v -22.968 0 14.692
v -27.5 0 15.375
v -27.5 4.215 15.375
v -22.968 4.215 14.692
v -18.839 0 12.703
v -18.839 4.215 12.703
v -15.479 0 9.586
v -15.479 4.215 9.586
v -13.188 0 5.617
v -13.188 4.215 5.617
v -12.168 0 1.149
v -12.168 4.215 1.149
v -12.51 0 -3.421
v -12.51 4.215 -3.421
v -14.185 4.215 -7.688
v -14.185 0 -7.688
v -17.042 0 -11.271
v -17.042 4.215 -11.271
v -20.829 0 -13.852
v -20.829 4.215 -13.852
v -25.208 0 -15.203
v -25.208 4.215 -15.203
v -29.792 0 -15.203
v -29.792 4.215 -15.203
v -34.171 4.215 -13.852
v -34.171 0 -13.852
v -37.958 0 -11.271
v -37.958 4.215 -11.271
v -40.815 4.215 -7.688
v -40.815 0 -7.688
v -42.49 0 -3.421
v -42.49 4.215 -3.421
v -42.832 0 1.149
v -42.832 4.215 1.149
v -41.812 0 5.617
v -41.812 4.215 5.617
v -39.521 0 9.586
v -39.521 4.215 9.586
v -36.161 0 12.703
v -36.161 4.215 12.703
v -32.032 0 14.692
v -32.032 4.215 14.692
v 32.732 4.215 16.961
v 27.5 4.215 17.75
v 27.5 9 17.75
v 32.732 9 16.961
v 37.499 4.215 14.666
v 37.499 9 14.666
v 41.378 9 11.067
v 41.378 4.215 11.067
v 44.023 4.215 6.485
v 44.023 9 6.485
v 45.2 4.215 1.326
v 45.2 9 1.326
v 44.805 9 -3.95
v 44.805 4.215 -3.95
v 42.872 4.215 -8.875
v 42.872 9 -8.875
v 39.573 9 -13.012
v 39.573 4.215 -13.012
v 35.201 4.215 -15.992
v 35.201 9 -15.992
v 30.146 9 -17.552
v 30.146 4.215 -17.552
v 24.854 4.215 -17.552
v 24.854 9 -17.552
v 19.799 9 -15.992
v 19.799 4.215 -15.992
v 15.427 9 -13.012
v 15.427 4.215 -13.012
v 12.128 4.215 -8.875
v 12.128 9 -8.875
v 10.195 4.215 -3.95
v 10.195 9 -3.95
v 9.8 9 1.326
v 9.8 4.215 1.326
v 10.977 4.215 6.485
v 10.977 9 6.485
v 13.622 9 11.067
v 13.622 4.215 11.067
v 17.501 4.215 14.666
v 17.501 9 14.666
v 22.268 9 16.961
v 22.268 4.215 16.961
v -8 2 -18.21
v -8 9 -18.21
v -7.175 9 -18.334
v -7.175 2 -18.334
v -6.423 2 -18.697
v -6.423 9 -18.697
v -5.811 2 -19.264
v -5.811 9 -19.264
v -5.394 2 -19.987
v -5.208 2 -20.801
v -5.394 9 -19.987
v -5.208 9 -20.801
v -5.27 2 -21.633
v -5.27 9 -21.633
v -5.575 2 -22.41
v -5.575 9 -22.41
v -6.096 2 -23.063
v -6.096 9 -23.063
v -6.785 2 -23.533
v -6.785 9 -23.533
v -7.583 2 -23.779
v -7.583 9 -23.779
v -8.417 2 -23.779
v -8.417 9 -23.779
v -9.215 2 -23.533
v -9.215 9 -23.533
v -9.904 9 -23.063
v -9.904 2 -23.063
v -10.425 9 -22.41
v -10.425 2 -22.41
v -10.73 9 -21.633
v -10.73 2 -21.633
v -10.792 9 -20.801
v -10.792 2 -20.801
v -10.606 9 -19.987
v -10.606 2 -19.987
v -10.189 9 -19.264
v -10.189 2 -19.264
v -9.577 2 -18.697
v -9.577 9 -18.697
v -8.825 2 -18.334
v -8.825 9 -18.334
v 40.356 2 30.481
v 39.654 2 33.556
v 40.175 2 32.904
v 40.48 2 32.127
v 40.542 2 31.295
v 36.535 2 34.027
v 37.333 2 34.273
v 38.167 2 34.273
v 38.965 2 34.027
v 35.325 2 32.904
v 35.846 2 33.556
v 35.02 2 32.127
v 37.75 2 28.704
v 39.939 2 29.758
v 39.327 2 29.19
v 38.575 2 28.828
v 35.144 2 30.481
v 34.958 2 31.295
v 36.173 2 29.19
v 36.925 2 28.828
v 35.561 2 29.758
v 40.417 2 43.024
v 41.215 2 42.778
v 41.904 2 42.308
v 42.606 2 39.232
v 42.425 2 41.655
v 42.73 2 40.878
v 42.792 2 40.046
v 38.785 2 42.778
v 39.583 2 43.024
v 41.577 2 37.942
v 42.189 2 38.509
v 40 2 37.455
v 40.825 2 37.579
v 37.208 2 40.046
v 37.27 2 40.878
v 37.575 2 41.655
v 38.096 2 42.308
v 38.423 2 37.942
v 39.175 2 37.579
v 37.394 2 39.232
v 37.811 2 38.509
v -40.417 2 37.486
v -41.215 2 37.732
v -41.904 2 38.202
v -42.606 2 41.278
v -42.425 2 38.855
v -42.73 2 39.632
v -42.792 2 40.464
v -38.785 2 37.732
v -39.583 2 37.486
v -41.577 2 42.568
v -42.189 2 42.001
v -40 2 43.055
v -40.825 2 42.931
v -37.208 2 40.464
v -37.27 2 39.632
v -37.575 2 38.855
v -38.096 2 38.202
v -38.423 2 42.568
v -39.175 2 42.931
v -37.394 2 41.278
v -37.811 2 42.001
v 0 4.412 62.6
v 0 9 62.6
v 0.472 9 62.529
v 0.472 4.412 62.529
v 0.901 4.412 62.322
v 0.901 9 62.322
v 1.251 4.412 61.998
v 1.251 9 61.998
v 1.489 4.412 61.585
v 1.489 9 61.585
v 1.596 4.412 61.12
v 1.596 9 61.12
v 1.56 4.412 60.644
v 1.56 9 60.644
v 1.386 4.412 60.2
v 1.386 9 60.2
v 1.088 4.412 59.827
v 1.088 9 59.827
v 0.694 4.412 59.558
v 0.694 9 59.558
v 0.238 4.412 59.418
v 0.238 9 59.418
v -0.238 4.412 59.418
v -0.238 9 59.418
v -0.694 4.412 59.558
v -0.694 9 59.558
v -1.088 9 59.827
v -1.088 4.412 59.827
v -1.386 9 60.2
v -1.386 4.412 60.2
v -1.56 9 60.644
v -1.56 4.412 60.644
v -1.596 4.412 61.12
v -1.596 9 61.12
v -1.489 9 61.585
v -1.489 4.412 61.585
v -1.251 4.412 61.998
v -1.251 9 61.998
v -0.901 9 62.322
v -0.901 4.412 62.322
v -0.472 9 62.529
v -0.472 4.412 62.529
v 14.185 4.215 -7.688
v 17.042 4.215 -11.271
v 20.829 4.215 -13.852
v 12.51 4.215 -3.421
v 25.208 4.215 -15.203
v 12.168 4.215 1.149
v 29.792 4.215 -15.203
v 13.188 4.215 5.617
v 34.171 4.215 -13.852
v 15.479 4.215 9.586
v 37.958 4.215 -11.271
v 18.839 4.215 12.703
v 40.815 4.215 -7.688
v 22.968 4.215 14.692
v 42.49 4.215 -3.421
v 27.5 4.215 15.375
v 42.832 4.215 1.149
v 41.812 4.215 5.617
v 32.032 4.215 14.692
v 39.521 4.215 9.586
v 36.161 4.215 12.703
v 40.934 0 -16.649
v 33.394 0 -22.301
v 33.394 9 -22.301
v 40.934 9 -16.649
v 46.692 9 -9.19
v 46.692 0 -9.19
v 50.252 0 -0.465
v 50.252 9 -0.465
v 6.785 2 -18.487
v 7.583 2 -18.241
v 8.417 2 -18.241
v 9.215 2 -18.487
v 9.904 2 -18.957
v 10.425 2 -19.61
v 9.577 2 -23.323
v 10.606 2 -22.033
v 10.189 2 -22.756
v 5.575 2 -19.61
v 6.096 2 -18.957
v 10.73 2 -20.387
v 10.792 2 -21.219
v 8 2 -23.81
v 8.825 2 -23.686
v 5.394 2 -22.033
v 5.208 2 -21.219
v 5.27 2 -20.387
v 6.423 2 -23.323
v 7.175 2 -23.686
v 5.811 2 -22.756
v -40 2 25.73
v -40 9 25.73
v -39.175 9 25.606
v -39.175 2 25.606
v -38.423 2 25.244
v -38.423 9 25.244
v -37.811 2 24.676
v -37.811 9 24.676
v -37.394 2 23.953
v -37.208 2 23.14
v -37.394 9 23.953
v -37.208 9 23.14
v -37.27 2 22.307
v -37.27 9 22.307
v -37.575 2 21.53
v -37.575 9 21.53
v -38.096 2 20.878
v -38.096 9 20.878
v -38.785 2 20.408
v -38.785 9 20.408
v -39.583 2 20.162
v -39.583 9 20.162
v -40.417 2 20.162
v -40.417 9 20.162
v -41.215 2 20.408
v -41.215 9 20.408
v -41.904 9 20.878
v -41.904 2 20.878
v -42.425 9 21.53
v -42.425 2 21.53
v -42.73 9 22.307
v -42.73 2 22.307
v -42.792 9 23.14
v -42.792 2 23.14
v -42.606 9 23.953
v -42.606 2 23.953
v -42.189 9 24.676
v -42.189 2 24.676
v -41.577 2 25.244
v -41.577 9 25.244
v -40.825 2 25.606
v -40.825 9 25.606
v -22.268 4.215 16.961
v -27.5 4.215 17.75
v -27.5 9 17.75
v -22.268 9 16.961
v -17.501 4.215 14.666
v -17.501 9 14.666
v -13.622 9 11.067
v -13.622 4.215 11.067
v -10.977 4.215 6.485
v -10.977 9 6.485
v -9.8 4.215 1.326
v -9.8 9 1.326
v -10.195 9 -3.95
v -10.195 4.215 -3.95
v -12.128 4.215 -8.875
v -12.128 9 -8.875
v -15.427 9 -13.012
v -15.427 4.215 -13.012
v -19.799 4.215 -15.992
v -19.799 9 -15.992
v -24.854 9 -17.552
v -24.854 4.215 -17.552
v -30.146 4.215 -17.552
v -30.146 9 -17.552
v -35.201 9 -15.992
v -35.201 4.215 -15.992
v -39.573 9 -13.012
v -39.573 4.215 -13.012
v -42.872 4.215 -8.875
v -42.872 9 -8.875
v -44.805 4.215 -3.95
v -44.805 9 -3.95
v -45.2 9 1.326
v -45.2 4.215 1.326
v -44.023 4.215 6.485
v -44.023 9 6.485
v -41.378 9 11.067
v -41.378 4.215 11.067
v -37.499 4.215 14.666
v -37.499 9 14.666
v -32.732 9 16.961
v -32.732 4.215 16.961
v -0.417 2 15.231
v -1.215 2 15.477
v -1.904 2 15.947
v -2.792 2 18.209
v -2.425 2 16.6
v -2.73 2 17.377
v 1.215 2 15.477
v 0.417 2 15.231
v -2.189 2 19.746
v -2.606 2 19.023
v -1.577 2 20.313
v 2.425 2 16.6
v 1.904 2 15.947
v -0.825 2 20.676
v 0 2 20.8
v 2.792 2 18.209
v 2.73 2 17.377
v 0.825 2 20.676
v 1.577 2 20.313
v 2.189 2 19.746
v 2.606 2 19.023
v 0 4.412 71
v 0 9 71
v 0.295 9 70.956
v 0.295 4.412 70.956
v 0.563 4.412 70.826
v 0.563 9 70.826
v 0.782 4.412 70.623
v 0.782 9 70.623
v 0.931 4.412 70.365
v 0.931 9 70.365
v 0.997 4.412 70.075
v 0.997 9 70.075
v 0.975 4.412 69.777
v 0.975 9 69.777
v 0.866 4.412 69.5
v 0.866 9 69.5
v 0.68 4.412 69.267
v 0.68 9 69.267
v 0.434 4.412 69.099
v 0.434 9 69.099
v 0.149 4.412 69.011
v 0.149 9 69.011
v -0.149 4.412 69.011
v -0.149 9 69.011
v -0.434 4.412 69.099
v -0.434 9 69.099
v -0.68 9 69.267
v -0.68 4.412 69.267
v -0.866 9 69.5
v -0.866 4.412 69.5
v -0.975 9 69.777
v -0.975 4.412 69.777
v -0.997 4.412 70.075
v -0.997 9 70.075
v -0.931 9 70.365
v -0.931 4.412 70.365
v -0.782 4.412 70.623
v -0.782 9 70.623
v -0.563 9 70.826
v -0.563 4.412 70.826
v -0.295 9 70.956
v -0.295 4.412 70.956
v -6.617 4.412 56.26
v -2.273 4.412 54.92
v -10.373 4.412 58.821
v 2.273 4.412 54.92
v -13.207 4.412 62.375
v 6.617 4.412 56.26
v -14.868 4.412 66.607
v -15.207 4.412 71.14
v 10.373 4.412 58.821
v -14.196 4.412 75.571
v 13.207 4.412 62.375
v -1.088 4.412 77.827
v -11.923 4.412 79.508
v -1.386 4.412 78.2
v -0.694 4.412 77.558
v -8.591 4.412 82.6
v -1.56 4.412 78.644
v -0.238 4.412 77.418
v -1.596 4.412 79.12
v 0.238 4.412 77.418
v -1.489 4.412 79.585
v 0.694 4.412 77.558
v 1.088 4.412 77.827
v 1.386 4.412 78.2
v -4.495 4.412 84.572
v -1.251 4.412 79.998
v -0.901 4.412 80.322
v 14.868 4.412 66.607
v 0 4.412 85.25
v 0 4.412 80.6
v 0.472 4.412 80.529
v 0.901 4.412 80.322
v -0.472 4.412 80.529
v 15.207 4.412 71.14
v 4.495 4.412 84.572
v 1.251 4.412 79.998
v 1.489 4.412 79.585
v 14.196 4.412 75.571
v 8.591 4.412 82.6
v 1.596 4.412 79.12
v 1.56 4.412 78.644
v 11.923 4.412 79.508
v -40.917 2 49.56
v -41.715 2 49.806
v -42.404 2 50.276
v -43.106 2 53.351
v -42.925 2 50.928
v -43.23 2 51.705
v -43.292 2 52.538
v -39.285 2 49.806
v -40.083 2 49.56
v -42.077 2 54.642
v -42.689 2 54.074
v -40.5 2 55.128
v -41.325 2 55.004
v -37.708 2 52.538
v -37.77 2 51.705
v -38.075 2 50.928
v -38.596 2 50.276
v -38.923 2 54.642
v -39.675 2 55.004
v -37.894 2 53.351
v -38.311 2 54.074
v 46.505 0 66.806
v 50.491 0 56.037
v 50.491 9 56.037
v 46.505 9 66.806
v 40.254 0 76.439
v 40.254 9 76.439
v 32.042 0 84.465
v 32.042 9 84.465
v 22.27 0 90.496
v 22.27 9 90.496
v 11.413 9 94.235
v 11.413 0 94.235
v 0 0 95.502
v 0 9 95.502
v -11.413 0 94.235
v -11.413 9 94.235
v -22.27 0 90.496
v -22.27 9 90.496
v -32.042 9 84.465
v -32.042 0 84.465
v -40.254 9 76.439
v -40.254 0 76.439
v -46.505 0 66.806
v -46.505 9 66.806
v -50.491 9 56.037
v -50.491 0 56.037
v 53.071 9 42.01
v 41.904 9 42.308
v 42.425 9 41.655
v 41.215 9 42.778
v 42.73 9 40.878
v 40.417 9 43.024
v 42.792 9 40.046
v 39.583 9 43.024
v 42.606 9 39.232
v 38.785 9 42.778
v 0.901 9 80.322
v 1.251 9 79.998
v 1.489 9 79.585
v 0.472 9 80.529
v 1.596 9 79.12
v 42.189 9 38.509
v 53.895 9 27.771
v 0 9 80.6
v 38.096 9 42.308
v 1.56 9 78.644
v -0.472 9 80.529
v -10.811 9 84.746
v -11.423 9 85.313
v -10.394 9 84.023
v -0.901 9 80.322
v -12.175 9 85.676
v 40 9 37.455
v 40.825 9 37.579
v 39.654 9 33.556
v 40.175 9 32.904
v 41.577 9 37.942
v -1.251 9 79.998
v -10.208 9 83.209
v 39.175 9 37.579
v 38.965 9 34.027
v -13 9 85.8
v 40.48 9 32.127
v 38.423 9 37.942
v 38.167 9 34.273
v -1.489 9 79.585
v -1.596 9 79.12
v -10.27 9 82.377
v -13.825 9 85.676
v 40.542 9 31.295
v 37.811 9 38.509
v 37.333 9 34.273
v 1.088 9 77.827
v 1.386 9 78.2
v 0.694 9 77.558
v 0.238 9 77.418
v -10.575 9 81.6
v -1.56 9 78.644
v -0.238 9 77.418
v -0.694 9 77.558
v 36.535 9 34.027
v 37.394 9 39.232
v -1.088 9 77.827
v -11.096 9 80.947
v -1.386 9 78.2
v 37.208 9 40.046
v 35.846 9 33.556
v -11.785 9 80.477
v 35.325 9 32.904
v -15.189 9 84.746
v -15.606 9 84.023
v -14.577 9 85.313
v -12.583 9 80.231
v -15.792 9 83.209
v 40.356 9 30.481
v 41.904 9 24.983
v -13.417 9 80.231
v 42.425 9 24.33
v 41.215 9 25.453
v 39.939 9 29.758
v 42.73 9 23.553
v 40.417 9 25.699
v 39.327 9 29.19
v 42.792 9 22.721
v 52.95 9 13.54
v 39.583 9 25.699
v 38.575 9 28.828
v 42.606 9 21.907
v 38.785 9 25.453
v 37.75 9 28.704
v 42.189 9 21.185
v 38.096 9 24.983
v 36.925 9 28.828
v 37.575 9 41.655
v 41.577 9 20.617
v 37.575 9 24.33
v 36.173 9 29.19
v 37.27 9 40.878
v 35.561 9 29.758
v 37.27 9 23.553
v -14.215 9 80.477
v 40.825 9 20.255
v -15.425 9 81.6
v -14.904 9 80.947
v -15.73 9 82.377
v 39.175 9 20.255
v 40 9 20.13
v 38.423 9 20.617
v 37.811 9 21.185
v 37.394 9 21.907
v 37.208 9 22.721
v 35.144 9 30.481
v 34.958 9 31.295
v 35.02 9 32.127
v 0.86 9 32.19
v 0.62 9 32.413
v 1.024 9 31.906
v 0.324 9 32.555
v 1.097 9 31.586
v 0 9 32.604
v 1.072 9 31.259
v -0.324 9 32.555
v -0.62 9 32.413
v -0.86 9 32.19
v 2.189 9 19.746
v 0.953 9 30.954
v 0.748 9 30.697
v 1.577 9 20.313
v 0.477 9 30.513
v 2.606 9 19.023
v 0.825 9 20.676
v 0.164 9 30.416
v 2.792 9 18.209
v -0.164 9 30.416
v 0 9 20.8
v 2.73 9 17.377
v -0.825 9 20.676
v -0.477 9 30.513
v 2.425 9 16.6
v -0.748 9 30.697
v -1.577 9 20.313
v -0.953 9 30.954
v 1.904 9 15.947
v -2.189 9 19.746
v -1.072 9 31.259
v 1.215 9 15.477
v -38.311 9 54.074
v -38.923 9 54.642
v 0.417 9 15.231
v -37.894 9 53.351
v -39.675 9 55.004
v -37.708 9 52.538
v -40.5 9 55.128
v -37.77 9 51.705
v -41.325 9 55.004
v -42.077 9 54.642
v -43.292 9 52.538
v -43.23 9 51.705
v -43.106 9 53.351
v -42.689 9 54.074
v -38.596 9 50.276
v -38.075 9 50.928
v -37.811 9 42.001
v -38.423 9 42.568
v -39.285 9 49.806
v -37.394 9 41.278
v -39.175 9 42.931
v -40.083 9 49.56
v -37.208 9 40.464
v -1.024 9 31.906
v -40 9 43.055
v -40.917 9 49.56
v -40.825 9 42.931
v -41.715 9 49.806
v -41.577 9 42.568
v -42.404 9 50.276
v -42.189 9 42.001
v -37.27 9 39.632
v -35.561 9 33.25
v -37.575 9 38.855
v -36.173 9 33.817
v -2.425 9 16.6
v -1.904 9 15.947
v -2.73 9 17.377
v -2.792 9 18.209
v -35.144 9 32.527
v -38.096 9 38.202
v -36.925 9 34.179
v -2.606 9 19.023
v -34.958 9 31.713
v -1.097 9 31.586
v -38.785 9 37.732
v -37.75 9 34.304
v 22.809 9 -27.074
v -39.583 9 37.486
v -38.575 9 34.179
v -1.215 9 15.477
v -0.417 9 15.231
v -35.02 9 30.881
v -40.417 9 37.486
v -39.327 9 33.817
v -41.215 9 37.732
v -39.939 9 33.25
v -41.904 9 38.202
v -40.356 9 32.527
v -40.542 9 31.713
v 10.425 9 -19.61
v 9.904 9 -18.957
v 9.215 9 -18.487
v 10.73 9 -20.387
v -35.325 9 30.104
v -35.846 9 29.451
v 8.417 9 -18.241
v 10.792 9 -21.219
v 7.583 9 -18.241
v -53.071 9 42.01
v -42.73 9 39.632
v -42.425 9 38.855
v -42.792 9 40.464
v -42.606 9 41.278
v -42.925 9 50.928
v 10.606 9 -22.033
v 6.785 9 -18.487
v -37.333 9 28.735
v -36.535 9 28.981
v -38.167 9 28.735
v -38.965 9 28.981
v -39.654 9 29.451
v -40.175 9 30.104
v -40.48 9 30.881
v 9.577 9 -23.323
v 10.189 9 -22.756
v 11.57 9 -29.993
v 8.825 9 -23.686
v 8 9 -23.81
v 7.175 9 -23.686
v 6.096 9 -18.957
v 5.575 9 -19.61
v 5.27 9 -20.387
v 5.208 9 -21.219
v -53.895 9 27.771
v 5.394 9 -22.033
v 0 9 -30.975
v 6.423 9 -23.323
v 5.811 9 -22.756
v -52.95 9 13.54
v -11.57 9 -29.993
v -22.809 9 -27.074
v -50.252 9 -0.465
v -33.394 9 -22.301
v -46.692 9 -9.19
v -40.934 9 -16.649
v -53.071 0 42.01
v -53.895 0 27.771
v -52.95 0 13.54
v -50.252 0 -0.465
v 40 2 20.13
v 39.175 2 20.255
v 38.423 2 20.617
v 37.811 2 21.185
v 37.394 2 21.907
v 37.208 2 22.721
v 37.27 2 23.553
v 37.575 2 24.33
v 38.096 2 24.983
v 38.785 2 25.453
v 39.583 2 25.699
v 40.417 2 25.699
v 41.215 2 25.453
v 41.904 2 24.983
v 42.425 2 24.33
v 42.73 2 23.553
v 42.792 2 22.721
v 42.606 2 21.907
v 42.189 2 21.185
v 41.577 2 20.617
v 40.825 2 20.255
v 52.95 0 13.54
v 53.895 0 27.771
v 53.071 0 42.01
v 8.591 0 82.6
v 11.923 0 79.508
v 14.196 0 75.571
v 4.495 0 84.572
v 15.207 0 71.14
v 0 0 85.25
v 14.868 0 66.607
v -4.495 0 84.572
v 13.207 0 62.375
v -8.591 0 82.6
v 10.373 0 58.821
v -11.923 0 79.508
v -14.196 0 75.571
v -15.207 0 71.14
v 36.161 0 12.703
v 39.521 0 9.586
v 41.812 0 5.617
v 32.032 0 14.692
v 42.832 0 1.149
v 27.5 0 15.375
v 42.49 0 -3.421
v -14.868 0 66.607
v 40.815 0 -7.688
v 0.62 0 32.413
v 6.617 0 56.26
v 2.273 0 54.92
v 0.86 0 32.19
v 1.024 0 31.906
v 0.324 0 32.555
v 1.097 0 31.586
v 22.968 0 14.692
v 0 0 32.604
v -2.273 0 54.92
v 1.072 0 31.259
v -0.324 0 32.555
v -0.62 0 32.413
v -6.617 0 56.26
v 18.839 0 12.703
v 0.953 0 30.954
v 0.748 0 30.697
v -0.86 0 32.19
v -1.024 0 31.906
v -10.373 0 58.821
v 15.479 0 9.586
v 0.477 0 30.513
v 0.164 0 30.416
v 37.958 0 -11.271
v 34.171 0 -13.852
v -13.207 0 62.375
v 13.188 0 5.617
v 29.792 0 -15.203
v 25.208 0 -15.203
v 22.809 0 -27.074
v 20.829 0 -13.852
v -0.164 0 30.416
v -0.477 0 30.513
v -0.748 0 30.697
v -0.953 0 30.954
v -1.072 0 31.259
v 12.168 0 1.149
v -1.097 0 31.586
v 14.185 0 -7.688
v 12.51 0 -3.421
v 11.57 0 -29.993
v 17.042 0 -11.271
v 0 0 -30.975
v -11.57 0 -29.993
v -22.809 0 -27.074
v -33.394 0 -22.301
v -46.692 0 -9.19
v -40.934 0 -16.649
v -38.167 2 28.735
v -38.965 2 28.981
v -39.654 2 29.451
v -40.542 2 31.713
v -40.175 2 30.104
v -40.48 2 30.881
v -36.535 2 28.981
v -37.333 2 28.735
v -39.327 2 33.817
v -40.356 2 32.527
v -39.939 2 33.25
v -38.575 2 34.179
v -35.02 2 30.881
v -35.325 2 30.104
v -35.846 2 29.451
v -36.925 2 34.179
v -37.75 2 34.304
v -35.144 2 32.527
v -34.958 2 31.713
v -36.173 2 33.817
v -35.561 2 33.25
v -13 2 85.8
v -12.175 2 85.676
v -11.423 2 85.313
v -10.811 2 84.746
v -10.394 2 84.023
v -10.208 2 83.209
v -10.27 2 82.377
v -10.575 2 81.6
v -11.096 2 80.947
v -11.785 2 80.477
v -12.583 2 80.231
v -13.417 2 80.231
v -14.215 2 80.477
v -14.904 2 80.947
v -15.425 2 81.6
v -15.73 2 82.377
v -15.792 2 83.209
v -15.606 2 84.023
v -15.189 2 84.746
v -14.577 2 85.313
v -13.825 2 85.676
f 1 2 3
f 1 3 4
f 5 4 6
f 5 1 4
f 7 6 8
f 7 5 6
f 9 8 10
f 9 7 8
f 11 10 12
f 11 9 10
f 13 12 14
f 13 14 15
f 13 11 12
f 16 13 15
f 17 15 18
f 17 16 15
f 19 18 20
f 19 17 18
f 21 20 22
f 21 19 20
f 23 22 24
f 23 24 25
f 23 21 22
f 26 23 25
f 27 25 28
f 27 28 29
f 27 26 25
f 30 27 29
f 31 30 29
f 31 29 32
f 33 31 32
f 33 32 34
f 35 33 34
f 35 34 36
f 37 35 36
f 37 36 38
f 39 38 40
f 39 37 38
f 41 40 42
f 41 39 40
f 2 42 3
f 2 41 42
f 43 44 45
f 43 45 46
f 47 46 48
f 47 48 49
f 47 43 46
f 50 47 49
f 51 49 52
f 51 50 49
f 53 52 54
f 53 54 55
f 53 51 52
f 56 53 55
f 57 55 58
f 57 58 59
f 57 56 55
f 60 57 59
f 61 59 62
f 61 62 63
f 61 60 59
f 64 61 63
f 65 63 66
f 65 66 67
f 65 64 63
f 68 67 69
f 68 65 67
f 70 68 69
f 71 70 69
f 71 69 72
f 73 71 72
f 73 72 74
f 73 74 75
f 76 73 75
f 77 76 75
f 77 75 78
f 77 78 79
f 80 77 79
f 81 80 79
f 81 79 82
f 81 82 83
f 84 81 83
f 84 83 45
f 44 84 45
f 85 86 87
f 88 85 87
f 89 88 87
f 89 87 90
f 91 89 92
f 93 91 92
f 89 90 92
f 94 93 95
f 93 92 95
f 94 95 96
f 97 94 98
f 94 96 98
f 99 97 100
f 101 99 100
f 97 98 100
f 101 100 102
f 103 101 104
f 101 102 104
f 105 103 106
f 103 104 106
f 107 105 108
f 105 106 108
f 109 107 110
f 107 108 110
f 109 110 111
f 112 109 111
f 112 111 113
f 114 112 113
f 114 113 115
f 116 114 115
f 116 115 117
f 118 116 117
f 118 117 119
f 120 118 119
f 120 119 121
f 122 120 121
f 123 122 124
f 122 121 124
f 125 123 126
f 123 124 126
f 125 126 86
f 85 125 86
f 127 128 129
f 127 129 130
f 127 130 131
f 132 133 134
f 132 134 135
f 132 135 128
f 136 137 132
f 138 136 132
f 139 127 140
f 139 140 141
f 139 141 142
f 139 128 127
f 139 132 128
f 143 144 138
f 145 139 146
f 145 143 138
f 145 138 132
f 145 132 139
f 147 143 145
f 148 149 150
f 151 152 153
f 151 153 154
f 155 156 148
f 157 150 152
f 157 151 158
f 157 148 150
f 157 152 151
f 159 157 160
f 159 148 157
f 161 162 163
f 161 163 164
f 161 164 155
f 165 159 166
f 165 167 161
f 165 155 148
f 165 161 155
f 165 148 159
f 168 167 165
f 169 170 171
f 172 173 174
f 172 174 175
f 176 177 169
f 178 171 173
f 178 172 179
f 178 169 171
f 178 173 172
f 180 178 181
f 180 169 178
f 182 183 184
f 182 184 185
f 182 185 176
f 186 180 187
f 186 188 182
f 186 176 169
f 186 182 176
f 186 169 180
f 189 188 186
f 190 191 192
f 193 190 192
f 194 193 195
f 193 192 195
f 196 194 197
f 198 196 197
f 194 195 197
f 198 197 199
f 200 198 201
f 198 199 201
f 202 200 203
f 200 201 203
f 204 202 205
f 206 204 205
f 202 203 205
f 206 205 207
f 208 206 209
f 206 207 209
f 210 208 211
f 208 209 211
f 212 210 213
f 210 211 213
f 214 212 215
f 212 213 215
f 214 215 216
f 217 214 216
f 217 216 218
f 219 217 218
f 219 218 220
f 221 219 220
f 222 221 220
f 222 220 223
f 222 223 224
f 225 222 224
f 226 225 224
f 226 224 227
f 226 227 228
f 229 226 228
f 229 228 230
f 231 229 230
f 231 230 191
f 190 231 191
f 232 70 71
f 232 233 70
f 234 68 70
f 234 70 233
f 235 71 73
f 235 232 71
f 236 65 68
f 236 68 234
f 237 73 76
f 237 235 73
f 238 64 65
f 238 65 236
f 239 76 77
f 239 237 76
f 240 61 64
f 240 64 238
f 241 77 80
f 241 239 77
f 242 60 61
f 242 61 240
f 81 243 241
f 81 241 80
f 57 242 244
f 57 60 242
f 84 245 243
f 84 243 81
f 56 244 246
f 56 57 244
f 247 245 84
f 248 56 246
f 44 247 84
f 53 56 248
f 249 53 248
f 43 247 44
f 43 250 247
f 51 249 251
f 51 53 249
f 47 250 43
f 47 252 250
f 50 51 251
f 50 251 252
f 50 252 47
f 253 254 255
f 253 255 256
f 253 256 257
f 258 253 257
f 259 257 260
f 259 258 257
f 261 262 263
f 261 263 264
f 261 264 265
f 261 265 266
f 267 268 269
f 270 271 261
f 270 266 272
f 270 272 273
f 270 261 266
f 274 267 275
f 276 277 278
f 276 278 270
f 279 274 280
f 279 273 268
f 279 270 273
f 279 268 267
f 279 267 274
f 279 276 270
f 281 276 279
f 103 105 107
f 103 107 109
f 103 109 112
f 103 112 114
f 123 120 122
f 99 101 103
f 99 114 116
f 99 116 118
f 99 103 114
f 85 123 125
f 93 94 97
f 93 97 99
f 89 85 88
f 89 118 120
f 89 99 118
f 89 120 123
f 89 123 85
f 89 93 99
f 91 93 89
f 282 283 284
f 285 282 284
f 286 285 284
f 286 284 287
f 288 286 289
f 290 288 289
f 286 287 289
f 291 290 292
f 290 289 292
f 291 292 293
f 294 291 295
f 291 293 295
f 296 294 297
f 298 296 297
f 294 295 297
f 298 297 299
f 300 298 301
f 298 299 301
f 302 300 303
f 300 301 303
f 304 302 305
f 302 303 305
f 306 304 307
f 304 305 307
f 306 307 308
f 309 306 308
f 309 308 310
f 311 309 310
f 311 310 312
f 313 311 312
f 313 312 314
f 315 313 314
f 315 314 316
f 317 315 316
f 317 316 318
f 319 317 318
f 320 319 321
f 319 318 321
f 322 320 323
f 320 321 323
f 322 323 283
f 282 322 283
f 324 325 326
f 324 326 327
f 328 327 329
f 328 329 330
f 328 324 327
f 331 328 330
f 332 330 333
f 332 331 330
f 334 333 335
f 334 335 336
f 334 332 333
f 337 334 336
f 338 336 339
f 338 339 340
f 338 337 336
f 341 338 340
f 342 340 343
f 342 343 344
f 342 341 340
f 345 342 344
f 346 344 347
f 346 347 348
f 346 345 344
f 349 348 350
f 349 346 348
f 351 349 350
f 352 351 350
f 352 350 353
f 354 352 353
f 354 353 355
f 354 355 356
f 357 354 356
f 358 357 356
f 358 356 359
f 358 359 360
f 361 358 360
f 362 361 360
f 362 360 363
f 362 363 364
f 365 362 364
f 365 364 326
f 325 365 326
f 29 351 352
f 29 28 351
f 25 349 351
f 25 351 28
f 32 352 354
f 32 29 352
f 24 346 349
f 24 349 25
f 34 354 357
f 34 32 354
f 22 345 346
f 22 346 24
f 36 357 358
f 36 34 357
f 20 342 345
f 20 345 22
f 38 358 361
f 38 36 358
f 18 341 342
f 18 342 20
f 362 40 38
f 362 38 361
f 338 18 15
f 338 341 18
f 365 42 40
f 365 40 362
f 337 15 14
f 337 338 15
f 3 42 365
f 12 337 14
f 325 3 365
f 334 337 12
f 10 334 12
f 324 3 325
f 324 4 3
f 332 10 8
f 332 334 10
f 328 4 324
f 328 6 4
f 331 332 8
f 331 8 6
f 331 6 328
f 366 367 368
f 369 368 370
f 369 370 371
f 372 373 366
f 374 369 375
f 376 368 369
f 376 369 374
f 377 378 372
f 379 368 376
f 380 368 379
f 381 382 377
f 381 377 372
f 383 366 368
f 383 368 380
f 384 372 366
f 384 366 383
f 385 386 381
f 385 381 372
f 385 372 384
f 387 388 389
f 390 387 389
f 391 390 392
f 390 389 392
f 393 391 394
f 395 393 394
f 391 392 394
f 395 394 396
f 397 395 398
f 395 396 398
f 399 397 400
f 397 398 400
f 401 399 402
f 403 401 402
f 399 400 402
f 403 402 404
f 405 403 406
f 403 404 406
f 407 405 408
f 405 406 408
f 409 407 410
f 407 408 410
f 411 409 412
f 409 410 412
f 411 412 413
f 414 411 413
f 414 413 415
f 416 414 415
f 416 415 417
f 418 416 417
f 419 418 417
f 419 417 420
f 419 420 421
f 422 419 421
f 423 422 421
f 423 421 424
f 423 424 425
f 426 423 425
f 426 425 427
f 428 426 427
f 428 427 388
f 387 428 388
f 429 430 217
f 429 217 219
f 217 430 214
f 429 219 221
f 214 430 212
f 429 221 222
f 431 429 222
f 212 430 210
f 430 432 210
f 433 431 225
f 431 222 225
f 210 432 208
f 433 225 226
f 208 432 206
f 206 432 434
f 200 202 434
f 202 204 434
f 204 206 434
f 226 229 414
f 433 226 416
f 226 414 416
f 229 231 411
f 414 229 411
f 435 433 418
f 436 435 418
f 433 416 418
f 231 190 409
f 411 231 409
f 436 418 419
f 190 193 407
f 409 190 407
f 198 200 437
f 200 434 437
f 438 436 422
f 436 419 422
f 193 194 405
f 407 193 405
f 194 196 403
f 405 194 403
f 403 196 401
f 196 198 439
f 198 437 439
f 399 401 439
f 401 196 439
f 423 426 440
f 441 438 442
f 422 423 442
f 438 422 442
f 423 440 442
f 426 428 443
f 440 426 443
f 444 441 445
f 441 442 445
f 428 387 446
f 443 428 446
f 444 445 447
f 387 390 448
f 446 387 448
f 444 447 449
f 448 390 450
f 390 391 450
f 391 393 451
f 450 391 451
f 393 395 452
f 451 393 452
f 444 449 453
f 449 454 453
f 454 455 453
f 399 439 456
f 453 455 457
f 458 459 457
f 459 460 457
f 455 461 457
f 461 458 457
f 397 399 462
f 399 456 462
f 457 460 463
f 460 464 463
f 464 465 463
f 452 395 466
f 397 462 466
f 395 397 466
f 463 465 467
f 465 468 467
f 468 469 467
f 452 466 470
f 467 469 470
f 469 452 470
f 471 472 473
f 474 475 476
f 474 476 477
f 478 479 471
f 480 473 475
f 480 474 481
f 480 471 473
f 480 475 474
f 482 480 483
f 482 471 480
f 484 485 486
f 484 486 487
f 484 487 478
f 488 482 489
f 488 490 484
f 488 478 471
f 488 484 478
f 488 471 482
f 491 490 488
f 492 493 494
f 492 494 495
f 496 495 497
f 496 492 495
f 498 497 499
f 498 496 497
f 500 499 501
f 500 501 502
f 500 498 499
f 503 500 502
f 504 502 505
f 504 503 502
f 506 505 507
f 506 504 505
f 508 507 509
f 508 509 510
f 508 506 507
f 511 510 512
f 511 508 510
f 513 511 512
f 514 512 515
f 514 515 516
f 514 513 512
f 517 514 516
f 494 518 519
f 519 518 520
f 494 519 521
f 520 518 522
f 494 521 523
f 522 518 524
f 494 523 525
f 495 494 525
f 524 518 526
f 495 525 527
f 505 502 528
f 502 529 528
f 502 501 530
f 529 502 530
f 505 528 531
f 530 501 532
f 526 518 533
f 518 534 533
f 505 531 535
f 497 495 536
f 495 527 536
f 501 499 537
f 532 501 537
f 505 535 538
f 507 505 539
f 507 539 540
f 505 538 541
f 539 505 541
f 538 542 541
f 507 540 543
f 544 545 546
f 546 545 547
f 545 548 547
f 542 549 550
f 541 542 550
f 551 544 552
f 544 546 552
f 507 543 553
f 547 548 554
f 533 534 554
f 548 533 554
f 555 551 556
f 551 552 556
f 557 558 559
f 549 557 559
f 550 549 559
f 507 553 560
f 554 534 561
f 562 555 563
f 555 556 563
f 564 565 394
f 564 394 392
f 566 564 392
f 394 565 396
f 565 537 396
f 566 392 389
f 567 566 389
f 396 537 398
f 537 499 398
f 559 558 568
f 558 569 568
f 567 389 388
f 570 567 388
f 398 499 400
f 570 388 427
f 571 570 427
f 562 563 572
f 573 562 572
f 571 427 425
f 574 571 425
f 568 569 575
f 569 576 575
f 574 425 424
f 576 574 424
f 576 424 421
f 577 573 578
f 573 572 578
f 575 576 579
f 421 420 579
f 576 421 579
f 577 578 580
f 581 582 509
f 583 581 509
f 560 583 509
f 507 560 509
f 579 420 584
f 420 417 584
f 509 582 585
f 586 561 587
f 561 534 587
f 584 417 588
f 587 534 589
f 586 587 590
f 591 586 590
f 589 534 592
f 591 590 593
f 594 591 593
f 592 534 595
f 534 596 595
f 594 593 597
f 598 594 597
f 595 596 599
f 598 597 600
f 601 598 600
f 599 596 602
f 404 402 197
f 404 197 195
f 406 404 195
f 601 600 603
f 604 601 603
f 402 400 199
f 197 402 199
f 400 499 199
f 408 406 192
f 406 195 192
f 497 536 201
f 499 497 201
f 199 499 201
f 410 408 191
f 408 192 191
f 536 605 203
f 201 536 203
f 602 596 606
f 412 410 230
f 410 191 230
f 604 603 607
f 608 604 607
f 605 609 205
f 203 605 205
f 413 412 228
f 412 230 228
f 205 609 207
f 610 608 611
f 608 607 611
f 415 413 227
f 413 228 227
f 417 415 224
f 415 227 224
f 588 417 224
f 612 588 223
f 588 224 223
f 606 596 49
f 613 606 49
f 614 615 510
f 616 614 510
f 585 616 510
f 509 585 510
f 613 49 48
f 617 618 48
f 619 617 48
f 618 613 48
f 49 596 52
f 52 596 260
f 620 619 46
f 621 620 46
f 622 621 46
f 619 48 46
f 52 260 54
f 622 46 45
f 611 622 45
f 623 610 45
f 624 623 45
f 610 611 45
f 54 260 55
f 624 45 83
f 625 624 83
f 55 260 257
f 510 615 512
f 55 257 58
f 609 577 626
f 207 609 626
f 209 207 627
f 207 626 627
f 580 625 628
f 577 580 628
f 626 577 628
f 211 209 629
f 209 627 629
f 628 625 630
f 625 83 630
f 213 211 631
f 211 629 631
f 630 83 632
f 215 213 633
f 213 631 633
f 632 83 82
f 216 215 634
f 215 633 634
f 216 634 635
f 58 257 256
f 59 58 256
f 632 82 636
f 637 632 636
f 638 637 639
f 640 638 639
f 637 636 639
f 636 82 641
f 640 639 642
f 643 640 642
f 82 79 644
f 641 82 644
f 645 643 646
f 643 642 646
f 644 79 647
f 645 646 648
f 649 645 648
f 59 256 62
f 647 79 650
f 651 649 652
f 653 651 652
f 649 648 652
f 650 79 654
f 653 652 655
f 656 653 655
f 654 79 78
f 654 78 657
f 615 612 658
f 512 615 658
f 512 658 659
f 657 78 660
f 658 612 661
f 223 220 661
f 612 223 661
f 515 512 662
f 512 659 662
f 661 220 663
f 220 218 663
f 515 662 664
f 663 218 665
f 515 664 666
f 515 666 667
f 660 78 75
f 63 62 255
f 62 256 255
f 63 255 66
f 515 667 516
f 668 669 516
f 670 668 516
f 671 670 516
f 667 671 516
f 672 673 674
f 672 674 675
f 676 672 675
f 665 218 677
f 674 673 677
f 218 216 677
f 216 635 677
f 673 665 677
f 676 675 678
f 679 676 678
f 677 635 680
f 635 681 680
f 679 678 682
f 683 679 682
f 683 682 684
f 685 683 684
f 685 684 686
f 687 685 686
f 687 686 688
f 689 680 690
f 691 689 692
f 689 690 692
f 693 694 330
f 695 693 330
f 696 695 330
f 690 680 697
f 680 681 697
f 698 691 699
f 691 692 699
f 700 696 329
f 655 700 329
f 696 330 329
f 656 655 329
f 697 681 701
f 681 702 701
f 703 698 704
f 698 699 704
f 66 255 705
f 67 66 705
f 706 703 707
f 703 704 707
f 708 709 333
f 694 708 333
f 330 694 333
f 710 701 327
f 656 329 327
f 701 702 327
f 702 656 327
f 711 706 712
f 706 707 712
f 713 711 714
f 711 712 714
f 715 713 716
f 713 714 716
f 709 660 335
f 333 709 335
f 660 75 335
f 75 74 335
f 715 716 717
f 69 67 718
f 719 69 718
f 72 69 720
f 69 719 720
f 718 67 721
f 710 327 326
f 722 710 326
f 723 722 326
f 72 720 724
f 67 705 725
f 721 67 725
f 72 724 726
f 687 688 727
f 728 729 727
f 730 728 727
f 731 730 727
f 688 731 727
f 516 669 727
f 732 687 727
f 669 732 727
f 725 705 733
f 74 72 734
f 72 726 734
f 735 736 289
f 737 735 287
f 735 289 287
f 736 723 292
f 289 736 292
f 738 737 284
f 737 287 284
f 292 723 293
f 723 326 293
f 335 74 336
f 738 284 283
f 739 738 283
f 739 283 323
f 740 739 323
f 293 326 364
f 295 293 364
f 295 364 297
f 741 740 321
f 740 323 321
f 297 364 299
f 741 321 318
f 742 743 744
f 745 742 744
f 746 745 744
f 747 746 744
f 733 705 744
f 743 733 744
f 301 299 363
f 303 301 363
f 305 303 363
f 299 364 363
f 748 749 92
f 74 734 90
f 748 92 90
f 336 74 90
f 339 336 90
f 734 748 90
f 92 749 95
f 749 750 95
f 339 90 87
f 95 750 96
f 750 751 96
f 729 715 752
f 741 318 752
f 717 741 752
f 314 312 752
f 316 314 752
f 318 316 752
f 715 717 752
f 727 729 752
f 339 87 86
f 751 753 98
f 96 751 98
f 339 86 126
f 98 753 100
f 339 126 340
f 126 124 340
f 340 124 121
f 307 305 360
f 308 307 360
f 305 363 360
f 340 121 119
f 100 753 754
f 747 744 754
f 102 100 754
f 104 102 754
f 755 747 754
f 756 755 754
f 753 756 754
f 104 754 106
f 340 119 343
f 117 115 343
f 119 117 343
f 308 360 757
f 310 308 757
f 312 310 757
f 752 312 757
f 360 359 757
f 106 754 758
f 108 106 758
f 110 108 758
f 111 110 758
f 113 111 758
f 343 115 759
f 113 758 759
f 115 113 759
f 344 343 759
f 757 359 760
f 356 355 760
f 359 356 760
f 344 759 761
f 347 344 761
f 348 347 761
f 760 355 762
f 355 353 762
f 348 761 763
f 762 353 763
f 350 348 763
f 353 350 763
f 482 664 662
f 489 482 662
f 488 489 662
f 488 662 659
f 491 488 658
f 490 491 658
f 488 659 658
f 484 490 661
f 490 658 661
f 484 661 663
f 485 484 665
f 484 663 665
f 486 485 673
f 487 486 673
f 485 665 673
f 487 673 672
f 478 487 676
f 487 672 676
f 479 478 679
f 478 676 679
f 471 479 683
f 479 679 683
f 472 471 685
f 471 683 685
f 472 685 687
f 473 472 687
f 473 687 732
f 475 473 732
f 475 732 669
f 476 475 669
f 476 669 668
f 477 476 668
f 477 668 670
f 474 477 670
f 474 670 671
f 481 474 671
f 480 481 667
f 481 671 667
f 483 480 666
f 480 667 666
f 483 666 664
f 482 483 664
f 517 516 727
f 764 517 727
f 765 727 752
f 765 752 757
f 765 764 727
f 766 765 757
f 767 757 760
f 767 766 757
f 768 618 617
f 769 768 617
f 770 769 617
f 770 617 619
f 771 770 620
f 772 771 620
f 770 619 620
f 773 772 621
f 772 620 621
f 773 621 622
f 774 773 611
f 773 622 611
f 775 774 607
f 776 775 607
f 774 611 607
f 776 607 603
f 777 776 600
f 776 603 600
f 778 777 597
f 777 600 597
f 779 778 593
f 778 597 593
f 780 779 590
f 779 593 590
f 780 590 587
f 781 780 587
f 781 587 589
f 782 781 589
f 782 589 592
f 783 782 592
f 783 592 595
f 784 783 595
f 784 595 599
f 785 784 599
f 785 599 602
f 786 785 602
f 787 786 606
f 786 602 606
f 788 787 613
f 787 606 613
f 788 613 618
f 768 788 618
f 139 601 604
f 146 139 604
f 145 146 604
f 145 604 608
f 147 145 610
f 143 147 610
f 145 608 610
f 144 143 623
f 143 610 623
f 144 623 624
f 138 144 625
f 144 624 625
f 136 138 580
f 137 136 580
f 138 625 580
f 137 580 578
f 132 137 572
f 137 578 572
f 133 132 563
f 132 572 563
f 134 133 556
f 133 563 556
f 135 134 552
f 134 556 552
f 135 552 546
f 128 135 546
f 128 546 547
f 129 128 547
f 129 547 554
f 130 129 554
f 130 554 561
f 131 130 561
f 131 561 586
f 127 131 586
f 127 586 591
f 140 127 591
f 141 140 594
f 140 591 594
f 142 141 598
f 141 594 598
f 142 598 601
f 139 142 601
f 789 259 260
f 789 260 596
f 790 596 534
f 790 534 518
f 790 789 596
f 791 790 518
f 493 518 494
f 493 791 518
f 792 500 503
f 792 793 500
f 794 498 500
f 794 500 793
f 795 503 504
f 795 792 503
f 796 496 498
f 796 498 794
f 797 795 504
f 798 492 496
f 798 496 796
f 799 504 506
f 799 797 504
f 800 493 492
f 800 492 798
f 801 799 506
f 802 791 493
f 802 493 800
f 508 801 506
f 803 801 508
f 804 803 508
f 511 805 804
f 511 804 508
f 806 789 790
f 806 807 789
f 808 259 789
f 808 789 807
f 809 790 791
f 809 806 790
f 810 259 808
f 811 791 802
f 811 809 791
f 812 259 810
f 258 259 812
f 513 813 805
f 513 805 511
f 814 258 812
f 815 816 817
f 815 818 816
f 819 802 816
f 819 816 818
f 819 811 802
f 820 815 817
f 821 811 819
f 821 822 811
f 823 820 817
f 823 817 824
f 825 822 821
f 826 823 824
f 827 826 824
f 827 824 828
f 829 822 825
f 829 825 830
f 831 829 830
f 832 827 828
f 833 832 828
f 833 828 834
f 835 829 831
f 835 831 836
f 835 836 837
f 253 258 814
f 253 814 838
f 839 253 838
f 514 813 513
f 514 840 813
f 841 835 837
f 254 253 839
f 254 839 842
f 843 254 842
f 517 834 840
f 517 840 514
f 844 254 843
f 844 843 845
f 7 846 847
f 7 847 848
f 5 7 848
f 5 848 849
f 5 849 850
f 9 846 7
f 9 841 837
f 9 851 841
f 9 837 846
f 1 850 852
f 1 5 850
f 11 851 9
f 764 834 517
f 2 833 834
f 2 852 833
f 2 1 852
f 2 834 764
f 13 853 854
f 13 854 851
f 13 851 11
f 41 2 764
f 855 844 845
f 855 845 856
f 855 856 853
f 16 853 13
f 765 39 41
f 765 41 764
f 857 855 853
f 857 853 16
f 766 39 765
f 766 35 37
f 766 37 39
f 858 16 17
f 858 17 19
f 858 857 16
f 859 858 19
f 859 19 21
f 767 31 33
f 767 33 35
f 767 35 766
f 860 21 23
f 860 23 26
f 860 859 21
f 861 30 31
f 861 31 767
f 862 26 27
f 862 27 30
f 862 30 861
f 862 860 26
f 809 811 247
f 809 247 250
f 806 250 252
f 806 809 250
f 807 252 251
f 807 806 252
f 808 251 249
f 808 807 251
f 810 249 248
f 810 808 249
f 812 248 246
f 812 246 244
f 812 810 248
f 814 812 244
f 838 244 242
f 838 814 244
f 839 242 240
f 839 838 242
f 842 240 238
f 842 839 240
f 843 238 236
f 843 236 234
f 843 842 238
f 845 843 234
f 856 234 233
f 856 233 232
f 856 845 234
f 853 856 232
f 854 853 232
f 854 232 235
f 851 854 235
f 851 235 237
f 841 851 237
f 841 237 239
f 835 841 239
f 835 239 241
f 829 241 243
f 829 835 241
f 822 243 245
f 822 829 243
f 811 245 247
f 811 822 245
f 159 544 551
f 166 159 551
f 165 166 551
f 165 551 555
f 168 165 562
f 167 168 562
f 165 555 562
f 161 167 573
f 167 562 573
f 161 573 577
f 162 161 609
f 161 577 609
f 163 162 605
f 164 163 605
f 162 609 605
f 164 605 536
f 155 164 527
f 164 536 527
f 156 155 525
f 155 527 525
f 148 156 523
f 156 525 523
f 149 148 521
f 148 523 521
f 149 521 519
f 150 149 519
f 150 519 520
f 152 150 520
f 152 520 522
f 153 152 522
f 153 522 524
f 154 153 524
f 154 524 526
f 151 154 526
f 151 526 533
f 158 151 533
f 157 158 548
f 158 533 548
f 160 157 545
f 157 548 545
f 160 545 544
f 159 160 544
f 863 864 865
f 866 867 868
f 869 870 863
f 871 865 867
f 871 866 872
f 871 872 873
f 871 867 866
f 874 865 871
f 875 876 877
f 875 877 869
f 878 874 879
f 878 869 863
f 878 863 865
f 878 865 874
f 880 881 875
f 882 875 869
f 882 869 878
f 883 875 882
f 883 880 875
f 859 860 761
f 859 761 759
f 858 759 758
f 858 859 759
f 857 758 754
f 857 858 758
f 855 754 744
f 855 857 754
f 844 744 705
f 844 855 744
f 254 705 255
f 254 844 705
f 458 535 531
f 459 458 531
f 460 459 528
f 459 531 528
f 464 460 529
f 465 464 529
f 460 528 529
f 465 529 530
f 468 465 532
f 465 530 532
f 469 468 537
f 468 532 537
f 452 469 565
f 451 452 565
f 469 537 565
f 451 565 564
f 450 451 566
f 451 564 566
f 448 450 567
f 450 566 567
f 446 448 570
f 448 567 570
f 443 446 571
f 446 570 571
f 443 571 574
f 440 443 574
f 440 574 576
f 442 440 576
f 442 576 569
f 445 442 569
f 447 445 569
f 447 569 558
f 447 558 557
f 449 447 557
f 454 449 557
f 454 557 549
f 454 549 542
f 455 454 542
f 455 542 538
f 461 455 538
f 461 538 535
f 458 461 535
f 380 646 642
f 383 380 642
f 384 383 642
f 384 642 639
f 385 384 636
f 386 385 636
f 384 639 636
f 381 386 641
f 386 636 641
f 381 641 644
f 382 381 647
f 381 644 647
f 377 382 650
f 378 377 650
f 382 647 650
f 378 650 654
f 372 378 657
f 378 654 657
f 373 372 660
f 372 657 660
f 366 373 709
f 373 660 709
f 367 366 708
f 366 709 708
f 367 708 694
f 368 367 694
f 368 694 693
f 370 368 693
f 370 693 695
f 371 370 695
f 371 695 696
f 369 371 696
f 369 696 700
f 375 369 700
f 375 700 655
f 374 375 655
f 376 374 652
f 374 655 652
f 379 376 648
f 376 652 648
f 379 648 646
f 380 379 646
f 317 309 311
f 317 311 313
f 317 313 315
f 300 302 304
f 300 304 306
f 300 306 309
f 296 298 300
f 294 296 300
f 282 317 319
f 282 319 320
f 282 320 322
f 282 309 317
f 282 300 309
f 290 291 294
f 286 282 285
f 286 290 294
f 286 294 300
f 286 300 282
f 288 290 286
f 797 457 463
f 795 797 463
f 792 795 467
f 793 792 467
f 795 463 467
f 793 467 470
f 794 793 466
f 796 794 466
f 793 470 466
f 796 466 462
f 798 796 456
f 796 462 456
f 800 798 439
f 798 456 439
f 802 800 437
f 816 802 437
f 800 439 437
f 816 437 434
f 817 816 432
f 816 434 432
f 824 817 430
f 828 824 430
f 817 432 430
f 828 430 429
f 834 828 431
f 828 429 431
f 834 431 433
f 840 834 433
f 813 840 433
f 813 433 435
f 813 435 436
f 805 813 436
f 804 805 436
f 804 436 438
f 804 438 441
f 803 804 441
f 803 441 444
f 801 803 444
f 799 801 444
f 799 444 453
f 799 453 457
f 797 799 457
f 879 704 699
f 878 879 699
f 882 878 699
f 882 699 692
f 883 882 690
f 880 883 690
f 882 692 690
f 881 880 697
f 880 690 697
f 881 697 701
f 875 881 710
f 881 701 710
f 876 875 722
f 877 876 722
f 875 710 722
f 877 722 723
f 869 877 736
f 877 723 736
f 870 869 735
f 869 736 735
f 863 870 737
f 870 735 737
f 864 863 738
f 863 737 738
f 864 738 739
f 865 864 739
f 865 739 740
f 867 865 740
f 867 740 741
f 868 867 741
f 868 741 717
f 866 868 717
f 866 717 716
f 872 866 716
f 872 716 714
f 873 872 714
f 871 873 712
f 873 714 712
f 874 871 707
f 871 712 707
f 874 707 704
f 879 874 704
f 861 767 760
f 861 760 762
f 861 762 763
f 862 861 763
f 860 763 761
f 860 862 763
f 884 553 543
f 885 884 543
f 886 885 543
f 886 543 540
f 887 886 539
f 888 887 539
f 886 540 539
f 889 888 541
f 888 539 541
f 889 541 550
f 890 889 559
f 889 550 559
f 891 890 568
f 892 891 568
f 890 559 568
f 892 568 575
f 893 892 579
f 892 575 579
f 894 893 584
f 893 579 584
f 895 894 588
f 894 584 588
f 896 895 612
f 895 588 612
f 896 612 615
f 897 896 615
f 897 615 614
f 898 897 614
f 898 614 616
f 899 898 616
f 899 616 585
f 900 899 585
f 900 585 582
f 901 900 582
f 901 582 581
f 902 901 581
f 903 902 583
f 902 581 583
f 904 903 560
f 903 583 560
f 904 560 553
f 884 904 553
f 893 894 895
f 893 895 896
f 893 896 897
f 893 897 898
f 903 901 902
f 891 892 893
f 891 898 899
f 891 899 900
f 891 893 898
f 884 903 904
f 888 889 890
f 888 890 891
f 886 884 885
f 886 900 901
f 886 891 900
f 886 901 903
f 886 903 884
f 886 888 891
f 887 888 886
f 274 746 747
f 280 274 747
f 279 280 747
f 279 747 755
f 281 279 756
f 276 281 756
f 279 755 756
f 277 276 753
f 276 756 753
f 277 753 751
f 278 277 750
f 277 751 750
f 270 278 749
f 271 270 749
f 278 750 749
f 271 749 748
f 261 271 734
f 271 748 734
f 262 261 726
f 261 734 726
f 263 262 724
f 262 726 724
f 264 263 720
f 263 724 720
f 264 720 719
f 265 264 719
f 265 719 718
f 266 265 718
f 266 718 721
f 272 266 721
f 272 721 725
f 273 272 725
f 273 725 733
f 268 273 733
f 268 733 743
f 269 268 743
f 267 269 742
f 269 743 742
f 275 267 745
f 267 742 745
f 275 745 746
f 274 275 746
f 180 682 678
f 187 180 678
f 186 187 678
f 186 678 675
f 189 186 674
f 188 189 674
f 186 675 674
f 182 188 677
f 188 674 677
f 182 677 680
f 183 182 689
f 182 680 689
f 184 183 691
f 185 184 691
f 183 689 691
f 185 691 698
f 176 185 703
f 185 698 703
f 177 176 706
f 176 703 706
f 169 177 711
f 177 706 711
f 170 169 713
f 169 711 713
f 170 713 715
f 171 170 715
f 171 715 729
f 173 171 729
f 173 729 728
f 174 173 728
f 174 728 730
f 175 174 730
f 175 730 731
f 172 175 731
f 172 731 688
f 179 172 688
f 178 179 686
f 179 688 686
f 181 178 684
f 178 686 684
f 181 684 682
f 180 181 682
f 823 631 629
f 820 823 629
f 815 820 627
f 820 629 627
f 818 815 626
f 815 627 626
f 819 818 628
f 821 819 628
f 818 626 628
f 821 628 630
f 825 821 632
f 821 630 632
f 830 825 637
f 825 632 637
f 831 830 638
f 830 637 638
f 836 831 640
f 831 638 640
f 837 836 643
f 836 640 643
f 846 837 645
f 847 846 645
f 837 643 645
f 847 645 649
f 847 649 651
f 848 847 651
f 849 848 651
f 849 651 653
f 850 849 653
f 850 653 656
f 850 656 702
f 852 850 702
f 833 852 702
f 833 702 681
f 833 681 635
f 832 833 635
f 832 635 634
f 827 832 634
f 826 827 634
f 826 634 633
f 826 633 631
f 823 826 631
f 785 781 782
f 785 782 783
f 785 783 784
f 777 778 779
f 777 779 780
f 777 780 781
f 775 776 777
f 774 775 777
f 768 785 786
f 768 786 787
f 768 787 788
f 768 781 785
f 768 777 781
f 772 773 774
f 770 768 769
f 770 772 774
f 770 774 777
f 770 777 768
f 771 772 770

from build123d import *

# Parameters (mm, degrees)
SKETCH1_R                     = 20
SKETCH1_R_2                   = 17.75
BOSS_EXTRUDE1_DEPTH           = 9
SKETCH2_R                     = 17.75
SKETCH2_R_2                   = 15.375
BOSS_EXTRUDE3_DEPTH           = 4.215
SKETCH4_R                     = 2.8
M3_TAPPING_INSERT_HOLES_DEPTH = 7
EXTRUDE_THIN2_START           = -9
EXTRUDE_THIN2_DEPTH           = 9
THUMB_KNUCKLE_HOLE_START      = -4.5875
SKETCH7_R                     = 15.25
THUMB_KNUCKLE_HOLE_DEPTH      = 106.441707798
SKETCH8_R                     = 1
SKETCH8_R_2                   = 1.6
THUMB_THROUGH_HOLE_S_DEPTH    = 111.029207798
SKETCH9_R                     = 1.1
CENTER_SCREW_THROUGH_DEPTH    = 111.029207798


with BuildPart() as part:
    # Sketch1 → Boss-Extrude1 (new body)
    # profile 1 of 3: a face of its own
    with BuildSketch(Plane(origin=(0, 0, 0), x_dir=(1, 0, 0), z_dir=(0, 1, 0))):
        with BuildLine():
            ThreePointArc((46.554987721, 6.075149623), (47.262334812, 3.074105201), (47.5, 0))
            ThreePointArc((47.5, 0), (9.667891023, -9.056262443), (39.298411056, 16.149225881))
            ThreePointArc((39.298411056, 16.149225881), (0, 28.975470321), (-39.298411056, 16.149225881))
            ThreePointArc((-39.298411056, 16.149225881), (-18.443737557, 17.832108977), (-7.5, 0))
            ThreePointArc((-7.5, 0), (-30.574105201, -19.762334812), (-46.554987721, 6.075149623))
            ThreePointArc((-46.554987721, 6.075149623), (-51.83640533, -24.60085732), (-48.549912051, -55.554205053))
            ThreePointArc((-48.549912051, -55.554205053), (0, -93.502323139), (48.549912051, -55.554205053))
            ThreePointArc((48.549912051, -55.554205053), (51.83640533, -24.60085732), (46.554987721, 6.075149623))
        make_face()
    # profile 2 of 3: a face of its own
    with BuildSketch(Plane(origin=(0, 0, 0), x_dir=(1, 0, 0), z_dir=(0, 1, 0))):
        with Locations((-27.5, 0)):
            Circle(SKETCH1_R)
        with Locations(Location((-27.5, 0, 0), (0, 0, 270))):
            Circle(SKETCH1_R_2, mode=Mode.SUBTRACT)
    # profile 3 of 3: a face of its own
    with BuildSketch(Plane(origin=(0, 0, 0), x_dir=(1, 0, 0), z_dir=(0, 1, 0))):
        with Locations((27.5, 0)):
            Circle(SKETCH1_R)
        with Locations(Location((27.5, 0, 0), (0, 0, 270))):
            Circle(SKETCH1_R_2, mode=Mode.SUBTRACT)
    extrude(amount=BOSS_EXTRUDE1_DEPTH)

    # Sketch2 → Boss-Extrude3 (add)
    # profile 1 of 2: a face of its own
    with BuildSketch(Plane(origin=(0, 0, 0), x_dir=(1, 0, 0), z_dir=(0, 1, 0))):
        with Locations(Location((-27.5, 0, 0), (0, 0, 270))):
            Circle(SKETCH2_R)
        with Locations(Location((-27.5, 0, 0), (0, 0, 270))):
            Circle(SKETCH2_R_2, mode=Mode.SUBTRACT)
    # profile 2 of 2: a face of its own
    with BuildSketch(Plane(origin=(0, 0, 0), x_dir=(1, 0, 0), z_dir=(0, 1, 0))):
        with Locations(Location((27.5, 0, 0), (0, 0, 270))):
            Circle(SKETCH2_R)
        with Locations(Location((27.5, 0, 0), (0, 0, 270))):
            Circle(SKETCH2_R_2, mode=Mode.SUBTRACT)
    extrude(amount=BOSS_EXTRUDE3_DEPTH)

    # Sketch4 → M3_Tapping_Insert_Holes (cut)
    with BuildSketch(Plane(origin=(0, 9, 0), x_dir=(1, 0, 0), z_dir=(0, 1, 0))):
        with Locations(Location((-8, 21.01, 0), (0, 0, 270))):
            Circle(SKETCH4_R)
        with Locations(Location((0, -18, 0), (0, 0, 270))):
            Circle(SKETCH4_R)
        with Locations(Location((-40, -22.9303, 0), (0, 0, 270))):
            Circle(SKETCH4_R)
        with Locations(Location((-37.75, -31.5038, 0), (0, 0, 270))):
            Circle(SKETCH4_R)
        with Locations(Location((-40, -40.255, 0), (0, 0, 270))):
            Circle(SKETCH4_R)
        with Locations(Location((-40.5, -52.3285, 0), (0, 0, 270))):
            Circle(SKETCH4_R)
        with Locations(Location((-13, -83, 0), (0, 0, 270))):
            Circle(SKETCH4_R)
        with Locations(Location((40, -40.255, 0), (0, 0, 90))):
            Circle(SKETCH4_R)
        with Locations(Location((37.75, -31.5038, 0), (0, 0, 90))):
            Circle(SKETCH4_R)
        with Locations(Location((40, -22.9303, 0), (0, 0, 90))):
            Circle(SKETCH4_R)
        with Locations(Location((8, 21.01, 0), (0, 0, 90))):
            Circle(SKETCH4_R)
    extrude(amount=-M3_TAPPING_INSERT_HOLES_DEPTH, mode=Mode.SUBTRACT)

    # Sketch5 → Extrude-Thin2 (add)
    with BuildSketch(Plane(origin=(0, 9, 0), x_dir=(1, 0, 0), z_dir=(0, 1, 0)).offset(EXTRUDE_THIN2_START)):
        with BuildLine():
            ThreePointArc((-50.490710842, -56.037216511), (-53.894544169, -27.770971196), (-50.251676697, 0.465463106))
            ThreePointArc((-50.251676697, 0.465463106), (-44.064896745, 13.114076138), (-33.394207534, 22.301026099))
            ThreePointArc((-33.394207534, 22.301026099), (0, 30.975470321), (33.394207534, 22.301026099))
            ThreePointArc((33.394207534, 22.301026099), (44.064896745, 13.114076138), (50.251676697, 0.465463106))
            ThreePointArc((50.251676697, 0.465463106), (53.894544169, -27.770971196), (50.490710842, -56.037216511))
            ThreePointArc((50.490710842, -56.037216511), (0, -95.502323157), (-50.490710842, -56.037216511))
        make_face()
        with BuildLine():
            ThreePointArc((-48.549912048, -55.554205085), (-51.894562065, -27.779432105), (-48.315034049, -0.033951806))
            ThreePointArc((-48.315034049, -0.033951806), (-42.481784381, 11.891883339), (-32.420848839, 20.55386473))
            ThreePointArc((-32.420848839, 20.55386473), (0, 28.975470321), (32.420848839, 20.55386473))
            ThreePointArc((32.420848839, 20.55386473), (42.481784381, 11.891883339), (48.315034049, -0.033951806))
            ThreePointArc((48.315034049, -0.033951806), (51.894562065, -27.779432105), (48.549912048, -55.554205085))
            ThreePointArc((48.549912048, -55.554205085), (0, -93.502323157), (-48.549912048, -55.554205085))
        make_face(mode=Mode.SUBTRACT)
    extrude(amount=EXTRUDE_THIN2_DEPTH)

    # Sketch7 → Thumb_Knuckle_Hole (cut, through all)
    with BuildSketch(Plane(origin=(0, 9, 0), x_dir=(1, 0, 0), z_dir=(0, 1, 0)).offset(THUMB_KNUCKLE_HOLE_START)):
        with Locations(Location((0, -70, 0), (0, 0, 270))):
            Circle(SKETCH7_R)
    extrude(amount=-THUMB_KNUCKLE_HOLE_DEPTH, mode=Mode.SUBTRACT)

    # Sketch8 → Thumb_Through_Hole(s) (cut, through all)
    with BuildSketch(Plane(origin=(0, 9, 0), x_dir=(1, 0, 0), z_dir=(0, 1, 0))):
        with Locations(Location((0, -70, 0), (0, 0, 270))):
            Circle(SKETCH8_R)
        with Locations(Location((0, -61, 0), (0, 0, 270))):
            Circle(SKETCH8_R_2)
        with Locations(Location((0, -79, 0), (0, 0, 270))):
            Circle(SKETCH8_R_2)
    extrude(amount=-THUMB_THROUGH_HOLE_S_DEPTH, mode=Mode.SUBTRACT)

    # Sketch9 → Center_Screw_Through (cut, through all)
    with BuildSketch(Plane(origin=(0, 9, 0), x_dir=(1, 0, 0), z_dir=(0, 1, 0))):
        with Locations(Location((0, -31.5037951, 0), (0, 0, 270))):
            Circle(SKETCH9_R)
    extrude(amount=-CENTER_SCREW_THROUGH_DEPTH, mode=Mode.SUBTRACT)


solid = part.part
